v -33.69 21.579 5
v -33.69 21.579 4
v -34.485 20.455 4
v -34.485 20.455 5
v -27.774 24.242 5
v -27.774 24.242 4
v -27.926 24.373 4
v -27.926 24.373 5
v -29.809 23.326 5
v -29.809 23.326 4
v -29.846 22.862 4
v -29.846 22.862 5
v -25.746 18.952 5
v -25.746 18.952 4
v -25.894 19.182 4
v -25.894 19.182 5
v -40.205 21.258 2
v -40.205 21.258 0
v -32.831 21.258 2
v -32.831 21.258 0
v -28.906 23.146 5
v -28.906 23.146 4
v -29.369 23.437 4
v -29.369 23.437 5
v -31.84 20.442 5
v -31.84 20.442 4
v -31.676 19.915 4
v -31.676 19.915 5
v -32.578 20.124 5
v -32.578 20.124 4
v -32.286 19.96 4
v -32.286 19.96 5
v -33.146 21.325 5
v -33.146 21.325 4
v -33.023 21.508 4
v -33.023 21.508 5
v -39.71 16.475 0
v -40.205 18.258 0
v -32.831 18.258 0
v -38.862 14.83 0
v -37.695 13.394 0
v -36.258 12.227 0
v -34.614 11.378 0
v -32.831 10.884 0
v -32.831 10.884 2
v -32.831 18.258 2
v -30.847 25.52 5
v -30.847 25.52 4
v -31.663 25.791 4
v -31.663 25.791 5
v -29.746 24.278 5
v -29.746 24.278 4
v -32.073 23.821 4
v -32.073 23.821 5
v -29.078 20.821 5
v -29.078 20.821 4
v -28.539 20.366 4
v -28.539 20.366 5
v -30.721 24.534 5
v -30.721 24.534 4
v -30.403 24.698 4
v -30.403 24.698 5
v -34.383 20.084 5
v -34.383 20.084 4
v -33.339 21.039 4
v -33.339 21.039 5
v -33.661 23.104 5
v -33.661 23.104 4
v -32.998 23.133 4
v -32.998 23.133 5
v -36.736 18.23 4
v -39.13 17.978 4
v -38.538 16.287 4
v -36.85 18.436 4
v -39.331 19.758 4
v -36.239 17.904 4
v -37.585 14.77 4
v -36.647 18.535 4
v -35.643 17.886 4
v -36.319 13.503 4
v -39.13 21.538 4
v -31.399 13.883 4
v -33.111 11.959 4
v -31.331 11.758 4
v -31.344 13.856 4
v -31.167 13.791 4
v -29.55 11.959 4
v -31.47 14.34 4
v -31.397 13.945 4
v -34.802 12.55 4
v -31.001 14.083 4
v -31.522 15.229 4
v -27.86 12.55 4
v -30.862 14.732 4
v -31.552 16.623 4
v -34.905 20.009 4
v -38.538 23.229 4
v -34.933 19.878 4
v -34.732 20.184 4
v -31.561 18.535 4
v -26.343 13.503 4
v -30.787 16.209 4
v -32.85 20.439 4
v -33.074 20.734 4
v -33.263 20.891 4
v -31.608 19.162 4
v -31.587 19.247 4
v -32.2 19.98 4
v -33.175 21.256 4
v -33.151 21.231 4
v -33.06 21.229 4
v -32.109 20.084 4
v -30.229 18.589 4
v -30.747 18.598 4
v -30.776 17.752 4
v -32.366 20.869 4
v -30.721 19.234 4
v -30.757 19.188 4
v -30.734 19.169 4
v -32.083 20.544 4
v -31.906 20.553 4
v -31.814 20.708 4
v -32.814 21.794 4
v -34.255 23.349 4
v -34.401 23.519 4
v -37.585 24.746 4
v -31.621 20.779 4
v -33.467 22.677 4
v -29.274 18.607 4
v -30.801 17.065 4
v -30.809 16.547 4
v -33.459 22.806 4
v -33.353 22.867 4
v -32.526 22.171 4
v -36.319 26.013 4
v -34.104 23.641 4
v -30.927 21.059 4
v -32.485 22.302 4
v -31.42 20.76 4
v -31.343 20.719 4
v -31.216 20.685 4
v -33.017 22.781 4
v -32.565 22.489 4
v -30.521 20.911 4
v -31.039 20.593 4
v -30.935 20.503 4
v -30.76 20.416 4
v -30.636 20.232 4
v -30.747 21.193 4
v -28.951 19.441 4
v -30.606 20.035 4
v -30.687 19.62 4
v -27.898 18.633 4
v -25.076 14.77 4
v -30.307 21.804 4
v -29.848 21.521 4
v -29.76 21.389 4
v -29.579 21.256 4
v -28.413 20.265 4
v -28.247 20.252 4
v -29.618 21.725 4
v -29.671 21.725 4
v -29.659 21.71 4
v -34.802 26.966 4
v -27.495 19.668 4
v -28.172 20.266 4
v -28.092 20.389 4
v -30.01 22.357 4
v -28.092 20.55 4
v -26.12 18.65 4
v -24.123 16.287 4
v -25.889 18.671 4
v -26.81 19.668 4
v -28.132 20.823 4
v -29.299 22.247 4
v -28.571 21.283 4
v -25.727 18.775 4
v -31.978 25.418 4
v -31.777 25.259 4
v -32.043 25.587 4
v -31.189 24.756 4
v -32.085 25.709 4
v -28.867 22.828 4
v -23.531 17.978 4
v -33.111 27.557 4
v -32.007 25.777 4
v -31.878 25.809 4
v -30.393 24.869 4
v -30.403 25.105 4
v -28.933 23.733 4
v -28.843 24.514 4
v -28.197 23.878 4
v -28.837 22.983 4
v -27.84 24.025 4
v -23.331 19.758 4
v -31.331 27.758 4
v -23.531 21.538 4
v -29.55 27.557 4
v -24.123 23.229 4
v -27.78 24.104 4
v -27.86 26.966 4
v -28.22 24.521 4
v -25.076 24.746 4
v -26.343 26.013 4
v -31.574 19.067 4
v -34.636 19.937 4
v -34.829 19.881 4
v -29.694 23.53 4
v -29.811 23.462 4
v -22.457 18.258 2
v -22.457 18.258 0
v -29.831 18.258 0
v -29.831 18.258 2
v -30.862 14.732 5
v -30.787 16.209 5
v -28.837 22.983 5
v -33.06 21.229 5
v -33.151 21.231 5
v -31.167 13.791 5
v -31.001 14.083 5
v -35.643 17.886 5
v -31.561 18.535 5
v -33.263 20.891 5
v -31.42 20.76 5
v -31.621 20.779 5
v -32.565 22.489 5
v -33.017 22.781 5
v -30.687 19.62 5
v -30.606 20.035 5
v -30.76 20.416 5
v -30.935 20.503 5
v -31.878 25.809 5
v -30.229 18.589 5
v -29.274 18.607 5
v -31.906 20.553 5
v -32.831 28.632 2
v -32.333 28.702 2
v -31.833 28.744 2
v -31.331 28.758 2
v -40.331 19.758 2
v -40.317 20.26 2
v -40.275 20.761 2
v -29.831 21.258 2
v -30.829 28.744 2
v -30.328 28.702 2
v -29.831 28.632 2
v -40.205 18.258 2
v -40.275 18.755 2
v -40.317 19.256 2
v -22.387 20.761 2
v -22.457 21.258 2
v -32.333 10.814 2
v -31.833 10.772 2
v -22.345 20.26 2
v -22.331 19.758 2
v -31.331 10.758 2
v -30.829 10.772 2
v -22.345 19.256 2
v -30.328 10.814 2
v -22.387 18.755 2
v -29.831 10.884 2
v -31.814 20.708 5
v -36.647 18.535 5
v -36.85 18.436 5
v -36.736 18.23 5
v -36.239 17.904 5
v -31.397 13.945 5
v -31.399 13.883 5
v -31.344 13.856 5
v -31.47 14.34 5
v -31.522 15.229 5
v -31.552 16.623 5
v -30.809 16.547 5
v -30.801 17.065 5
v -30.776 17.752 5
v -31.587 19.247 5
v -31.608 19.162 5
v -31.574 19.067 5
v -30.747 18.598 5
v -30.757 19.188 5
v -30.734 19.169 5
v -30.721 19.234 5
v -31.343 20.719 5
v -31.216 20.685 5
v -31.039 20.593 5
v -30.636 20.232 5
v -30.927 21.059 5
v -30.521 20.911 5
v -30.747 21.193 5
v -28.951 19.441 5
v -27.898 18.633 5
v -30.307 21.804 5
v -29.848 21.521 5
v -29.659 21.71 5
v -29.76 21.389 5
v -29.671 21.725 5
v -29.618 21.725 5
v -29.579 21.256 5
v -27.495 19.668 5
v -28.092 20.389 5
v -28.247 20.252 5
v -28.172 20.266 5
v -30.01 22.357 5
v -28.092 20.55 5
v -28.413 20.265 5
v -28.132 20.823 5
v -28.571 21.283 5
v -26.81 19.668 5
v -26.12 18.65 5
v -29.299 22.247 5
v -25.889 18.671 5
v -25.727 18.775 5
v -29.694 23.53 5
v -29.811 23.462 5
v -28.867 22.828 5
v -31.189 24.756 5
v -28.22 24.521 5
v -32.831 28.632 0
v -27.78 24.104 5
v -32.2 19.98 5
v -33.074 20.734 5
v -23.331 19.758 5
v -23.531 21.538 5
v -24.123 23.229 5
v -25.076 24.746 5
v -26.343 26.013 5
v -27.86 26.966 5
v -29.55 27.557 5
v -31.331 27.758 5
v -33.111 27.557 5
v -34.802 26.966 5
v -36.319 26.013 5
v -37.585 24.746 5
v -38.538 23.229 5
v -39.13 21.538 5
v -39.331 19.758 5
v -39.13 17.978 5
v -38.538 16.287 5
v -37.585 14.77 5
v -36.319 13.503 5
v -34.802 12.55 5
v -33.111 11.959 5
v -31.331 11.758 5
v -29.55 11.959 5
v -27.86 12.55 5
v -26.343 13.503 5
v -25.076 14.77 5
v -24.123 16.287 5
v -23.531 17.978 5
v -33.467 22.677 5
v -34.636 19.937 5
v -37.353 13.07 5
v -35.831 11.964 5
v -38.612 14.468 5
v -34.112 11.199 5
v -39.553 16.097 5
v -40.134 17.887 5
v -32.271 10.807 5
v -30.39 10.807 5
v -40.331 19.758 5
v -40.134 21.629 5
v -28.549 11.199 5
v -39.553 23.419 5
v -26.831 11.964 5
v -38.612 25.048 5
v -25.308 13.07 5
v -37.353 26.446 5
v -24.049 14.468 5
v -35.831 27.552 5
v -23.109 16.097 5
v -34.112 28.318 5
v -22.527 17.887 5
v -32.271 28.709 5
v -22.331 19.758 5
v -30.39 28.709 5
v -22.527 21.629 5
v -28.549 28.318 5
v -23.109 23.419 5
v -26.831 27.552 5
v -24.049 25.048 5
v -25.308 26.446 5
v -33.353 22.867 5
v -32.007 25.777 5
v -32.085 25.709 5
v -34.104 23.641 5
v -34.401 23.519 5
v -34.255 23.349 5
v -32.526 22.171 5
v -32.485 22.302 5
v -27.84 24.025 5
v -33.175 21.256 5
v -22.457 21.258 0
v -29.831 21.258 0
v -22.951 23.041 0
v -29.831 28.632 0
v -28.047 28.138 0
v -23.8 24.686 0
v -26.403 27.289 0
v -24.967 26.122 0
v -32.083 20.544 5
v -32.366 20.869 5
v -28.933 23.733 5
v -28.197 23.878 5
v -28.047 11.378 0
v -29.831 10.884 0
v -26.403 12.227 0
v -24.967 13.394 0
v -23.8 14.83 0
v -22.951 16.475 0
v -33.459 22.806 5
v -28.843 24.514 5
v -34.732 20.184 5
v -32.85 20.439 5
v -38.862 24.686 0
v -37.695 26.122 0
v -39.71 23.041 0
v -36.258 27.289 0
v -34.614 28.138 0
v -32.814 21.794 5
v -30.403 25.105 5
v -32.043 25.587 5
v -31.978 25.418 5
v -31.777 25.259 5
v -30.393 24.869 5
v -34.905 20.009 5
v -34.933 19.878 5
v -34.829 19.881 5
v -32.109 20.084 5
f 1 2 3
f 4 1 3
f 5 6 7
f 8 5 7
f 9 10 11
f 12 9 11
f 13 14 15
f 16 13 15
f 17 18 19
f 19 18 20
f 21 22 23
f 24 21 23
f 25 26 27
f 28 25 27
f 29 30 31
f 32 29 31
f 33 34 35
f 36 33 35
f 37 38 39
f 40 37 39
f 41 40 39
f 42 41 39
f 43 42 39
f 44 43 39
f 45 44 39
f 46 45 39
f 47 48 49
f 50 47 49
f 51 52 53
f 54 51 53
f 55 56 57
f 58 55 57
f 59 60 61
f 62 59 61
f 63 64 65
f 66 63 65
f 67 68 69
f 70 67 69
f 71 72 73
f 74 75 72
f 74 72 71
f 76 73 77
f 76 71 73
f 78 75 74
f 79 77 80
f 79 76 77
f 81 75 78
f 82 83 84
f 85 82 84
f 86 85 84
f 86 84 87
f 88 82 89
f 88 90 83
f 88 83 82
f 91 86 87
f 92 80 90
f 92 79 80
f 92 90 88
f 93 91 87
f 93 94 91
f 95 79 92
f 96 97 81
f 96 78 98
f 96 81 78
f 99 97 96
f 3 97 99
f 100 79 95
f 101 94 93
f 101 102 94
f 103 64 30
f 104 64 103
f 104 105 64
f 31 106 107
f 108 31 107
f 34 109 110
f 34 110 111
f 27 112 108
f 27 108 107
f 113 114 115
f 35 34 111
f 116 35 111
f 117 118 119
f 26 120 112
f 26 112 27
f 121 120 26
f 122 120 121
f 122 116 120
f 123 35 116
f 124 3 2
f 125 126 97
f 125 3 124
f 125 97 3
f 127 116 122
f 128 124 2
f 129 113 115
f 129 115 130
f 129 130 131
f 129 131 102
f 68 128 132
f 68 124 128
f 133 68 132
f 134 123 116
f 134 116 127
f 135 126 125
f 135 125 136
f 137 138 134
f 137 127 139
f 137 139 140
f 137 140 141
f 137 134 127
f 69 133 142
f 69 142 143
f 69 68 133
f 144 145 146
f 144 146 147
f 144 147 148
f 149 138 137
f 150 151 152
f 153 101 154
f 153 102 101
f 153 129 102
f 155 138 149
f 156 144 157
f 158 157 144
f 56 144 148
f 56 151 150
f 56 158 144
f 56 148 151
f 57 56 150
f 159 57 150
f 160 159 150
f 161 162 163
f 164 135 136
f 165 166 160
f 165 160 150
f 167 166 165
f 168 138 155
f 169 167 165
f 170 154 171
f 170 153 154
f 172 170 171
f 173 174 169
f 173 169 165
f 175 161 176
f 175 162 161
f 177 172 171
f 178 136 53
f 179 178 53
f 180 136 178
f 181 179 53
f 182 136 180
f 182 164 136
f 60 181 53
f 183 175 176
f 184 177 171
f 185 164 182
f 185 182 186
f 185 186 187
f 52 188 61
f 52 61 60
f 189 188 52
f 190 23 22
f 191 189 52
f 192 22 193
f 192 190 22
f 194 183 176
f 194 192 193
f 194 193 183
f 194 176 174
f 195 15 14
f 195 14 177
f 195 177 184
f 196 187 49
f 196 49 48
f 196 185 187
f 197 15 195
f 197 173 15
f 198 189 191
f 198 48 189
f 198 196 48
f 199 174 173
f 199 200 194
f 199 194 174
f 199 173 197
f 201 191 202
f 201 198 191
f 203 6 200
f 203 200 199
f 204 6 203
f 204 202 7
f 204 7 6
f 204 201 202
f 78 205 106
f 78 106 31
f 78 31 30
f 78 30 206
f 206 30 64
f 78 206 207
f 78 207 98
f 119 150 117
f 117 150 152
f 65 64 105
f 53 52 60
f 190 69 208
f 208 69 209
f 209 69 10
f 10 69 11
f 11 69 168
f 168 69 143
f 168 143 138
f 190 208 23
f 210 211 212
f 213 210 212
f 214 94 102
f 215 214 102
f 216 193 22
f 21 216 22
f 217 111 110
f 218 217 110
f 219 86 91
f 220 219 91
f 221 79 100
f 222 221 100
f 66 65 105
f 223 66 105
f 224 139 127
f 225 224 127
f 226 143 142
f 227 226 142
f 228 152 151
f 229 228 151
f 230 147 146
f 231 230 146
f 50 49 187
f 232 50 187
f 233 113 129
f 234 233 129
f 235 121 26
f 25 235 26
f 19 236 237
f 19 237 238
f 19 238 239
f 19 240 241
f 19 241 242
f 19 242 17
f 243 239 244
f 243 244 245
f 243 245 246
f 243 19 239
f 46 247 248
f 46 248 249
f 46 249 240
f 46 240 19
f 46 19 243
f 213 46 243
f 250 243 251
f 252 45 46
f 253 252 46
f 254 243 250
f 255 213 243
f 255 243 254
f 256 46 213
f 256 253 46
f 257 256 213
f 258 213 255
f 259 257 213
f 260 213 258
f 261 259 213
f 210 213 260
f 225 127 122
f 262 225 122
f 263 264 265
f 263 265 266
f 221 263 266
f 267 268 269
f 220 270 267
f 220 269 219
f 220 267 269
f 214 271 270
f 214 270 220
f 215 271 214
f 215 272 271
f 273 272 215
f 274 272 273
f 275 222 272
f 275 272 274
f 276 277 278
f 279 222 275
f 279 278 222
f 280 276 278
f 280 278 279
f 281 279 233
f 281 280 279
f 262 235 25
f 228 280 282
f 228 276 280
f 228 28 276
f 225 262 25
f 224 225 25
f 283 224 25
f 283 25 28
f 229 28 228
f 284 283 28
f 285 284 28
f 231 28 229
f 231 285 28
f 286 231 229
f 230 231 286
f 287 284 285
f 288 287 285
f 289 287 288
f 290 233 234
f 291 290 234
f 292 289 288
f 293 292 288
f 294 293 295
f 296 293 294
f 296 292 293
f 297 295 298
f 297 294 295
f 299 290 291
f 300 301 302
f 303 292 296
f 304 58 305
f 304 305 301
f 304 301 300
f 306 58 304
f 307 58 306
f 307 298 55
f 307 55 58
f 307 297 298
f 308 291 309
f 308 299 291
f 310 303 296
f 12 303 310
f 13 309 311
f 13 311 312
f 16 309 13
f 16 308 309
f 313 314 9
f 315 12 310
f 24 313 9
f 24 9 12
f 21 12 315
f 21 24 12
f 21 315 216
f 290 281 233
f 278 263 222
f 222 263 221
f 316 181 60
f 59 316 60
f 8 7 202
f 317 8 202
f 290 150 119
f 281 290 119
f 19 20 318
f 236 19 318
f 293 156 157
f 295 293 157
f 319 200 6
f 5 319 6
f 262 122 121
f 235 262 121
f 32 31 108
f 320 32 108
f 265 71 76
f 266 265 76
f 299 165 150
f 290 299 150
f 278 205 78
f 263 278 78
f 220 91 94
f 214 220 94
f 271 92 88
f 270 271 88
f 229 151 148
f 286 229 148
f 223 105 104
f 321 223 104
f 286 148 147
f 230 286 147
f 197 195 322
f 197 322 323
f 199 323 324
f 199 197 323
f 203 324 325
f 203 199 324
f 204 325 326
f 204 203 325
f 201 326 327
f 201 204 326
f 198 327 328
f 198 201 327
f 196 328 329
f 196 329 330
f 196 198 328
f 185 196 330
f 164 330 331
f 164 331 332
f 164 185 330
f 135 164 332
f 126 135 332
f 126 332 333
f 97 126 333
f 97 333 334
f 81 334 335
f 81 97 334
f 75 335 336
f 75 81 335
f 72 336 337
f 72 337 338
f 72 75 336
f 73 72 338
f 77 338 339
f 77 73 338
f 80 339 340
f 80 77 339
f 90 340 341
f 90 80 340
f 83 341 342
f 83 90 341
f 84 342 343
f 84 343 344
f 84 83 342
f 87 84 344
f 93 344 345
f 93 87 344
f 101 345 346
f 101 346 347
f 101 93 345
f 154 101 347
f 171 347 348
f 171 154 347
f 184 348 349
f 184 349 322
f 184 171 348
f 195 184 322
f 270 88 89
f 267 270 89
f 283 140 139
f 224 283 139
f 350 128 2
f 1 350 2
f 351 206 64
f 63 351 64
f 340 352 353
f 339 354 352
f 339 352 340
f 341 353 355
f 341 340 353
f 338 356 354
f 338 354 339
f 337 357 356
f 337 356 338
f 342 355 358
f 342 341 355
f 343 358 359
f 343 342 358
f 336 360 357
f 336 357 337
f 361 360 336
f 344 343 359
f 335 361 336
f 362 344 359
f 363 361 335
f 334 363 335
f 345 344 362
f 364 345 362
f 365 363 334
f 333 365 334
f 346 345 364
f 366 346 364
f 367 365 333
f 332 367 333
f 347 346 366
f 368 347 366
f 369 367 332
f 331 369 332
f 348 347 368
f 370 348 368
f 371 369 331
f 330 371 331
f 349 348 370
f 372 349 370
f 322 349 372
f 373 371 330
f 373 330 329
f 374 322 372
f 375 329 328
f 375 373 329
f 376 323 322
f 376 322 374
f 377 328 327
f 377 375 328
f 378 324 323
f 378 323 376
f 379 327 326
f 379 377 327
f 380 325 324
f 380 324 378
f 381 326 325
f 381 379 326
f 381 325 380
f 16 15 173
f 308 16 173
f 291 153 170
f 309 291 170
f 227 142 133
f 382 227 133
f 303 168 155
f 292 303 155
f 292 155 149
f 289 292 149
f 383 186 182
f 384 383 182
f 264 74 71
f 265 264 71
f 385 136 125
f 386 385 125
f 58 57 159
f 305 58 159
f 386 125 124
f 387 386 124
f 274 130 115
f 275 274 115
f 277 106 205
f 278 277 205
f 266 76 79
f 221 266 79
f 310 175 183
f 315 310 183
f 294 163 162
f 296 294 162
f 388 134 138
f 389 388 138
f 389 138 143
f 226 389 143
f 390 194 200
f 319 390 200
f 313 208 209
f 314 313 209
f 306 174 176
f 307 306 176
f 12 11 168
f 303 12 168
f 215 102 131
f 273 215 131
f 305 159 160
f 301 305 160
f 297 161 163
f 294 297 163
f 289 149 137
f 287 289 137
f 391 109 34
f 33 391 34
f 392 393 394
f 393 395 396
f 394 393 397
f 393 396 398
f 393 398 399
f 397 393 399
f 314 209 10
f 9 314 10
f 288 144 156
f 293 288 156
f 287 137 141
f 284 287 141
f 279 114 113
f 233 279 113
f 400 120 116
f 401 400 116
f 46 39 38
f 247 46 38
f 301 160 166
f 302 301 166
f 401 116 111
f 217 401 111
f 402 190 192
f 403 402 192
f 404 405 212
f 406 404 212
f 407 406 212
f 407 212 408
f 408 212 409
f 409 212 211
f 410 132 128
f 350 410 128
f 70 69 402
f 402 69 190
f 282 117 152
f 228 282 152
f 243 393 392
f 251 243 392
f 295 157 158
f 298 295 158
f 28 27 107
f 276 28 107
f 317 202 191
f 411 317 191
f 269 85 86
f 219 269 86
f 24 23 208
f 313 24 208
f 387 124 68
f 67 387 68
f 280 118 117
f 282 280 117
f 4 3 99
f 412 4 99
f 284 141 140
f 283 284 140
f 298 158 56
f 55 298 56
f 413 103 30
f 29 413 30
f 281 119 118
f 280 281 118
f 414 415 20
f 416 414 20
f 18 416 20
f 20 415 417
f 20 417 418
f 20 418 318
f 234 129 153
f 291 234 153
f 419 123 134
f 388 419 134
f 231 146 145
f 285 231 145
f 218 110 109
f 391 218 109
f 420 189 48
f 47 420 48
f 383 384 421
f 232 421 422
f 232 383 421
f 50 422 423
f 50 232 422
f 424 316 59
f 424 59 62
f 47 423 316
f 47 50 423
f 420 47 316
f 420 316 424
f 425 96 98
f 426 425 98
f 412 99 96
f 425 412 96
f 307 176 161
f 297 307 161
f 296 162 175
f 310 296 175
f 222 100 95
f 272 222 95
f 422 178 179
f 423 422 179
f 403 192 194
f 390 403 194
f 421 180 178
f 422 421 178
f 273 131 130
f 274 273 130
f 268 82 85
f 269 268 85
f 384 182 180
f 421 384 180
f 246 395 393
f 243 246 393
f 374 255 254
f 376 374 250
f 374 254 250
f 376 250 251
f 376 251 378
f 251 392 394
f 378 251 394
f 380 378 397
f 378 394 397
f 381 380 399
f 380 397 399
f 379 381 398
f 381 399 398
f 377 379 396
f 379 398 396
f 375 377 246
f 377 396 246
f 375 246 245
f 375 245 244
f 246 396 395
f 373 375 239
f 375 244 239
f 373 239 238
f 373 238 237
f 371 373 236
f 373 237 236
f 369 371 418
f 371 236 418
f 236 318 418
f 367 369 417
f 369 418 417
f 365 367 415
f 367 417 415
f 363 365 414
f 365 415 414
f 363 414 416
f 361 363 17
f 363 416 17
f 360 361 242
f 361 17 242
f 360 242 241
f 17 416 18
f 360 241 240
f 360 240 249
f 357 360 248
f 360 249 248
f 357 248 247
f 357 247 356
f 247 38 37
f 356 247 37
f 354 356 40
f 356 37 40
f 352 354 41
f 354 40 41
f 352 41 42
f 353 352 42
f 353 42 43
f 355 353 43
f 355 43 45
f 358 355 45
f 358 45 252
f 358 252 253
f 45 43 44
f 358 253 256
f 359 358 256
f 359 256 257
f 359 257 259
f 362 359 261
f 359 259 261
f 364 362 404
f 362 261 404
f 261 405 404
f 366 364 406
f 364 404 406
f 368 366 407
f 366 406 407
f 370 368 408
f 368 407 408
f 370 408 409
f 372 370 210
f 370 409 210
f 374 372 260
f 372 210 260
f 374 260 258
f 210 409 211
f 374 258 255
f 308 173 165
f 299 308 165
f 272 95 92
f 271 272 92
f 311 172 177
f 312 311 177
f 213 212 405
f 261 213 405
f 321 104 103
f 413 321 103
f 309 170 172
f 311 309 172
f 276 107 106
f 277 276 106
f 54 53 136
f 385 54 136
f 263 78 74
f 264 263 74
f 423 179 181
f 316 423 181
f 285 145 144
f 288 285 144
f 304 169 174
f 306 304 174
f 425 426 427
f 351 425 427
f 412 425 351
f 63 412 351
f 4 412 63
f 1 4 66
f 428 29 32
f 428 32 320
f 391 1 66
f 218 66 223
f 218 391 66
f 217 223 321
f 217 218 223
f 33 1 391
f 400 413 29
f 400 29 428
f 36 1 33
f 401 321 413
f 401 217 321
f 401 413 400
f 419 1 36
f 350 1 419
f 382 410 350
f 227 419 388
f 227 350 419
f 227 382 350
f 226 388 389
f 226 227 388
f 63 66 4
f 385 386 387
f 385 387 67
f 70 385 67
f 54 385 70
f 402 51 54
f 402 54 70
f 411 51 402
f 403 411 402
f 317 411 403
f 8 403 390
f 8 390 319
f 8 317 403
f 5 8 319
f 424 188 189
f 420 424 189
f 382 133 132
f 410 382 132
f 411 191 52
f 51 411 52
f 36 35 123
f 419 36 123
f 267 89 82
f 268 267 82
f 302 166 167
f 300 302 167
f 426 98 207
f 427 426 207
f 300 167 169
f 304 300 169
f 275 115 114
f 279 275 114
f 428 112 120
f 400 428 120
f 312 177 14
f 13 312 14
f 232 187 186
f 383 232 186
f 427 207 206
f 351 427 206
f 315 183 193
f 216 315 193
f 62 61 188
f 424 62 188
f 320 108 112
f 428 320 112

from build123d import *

# Parameters (mm, degrees)
F0_R     = 9
F1_DEPTH = 4
F3_W     = 3
F3_H     = 3
F4_DEPTH = 2
F2_R     = 9
F2_R_2   = 8
F5_DEPTH = 1
F7_DEPTH = 1


# Not quite as in the source:
# - a feature names something its author has since deleted; it is built from what else it names


with BuildPart() as f1:
    # F0 (on Top) → F1 (new body)
    with BuildSketch(Plane.XY):
        with Locations((-31.3306450844, 19.7580661625)):
            Circle(F0_R)
    extrude(amount=F1_DEPTH)

    # F3 (on face) → F4 (cut)
    with BuildSketch(Plane(origin=(0, 0, 0), x_dir=(1, 0, 0), z_dir=(0, 0, -1))):
        with BuildLine():
            ThreePointArc((-32.8306450844, -28.6321858371), (-32.0832814269, -28.7265408676), (-31.3306450844, -28.7580661625))
            ThreePointArc((-31.3306450844, -28.7580661625), (-30.5780087419, -28.7265408676), (-29.8306450844, -28.6321858371))
            Line((-29.8306450844, -28.6321858371), (-29.8306450844, -21.2580661625))
            Line((-29.8306450844, -21.2580661625), (-32.8306450844, -21.2580661625))
            Line((-32.8306450844, -21.2580661625), (-32.8306450844, -28.6321858371))
        make_face()
        with BuildLine():
            ThreePointArc((-40.204764759, -18.2580661625), (-40.2991197895, -19.0054298199), (-40.3306450844, -19.7580661625))
            ThreePointArc((-40.3306450844, -19.7580661625), (-40.2991197895, -20.510702505), (-40.204764759, -21.2580661625))
            Line((-40.204764759, -21.2580661625), (-32.8306450844, -21.2580661625))
            Line((-32.8306450844, -21.2580661625), (-32.8306450844, -18.2580661625))
            Line((-32.8306450844, -18.2580661625), (-40.204764759, -18.2580661625))
        make_face()
        with Locations((-31.3306450844, -19.7580661625)):
            Rectangle(F3_W, F3_H)
        with BuildLine():
            Line((-29.8306450844, -18.2580661625), (-29.8306450844, -21.2580661625))
            Line((-29.8306450844, -21.2580661625), (-22.4565254097, -21.2580661625))
            ThreePointArc((-22.4565254097, -21.2580661625), (-22.3621703793, -20.510702505), (-22.3306450844, -19.7580661625))
            ThreePointArc((-22.3306450844, -19.7580661625), (-22.3621703793, -19.0054298199), (-22.4565254097, -18.2580661625))
            Line((-22.4565254097, -18.2580661625), (-29.8306450844, -18.2580661625))
        make_face()
        with BuildLine():
            Line((-32.8306450844, -10.8839464878), (-32.8306450844, -18.2580661625))
            Line((-32.8306450844, -18.2580661625), (-29.8306450844, -18.2580661625))
            Line((-29.8306450844, -18.2580661625), (-29.8306450844, -10.8839464878))
            ThreePointArc((-29.8306450844, -10.8839464878), (-30.5780087419, -10.7895914574), (-31.3306450844, -10.7580661625))
            ThreePointArc((-31.3306450844, -10.7580661625), (-32.0832814269, -10.7895914574), (-32.8306450844, -10.8839464878))
        make_face()
    extrude(amount=-F4_DEPTH, mode=Mode.SUBTRACT)

    # F2 (on face) → F5 (join)
    with BuildSketch(Plane.XY.offset(4)):
        with Locations((-31.3306450844, 19.7580661625)):
            Circle(F2_R)
        with Locations((-31.3306450844, 19.7580661625)):
            Circle(F2_R_2, mode=Mode.SUBTRACT)
    extrude(amount=F5_DEPTH)

    # F6 (on face) → F7 (join)
    with BuildSketch(Plane.XY.offset(4)):
        Polygon((-31.9784342899, 25.4181322135), (-31.7774611038, 25.2590085979), (-31.1892692607, 24.7560993929), (-30.7208457687, 24.5338144768), (-30.4025390075, 24.6978790801), (-30.392716562, 24.8693254), (-30.4025390075, 25.1047664399), (-30.8471683696, 25.5198689359), (-31.6626039755, 25.7905517194), (-31.8783703596, 25.8094227206), (-32.0071634544, 25.7774551255), (-32.085100094, 25.7093528374), (-32.0432445706, 25.5871378045), align=None)
        Polygon((-32.0727952488, 23.82088353), (-34.1039519464, 23.641281604), (-34.4009291186, 23.5190665711), (-34.2549080498, 23.3492275605), (-33.6609834704, 23.1039640751), (-32.9981350893, 23.1326575217), (-28.9325058746, 23.7331363511), (-28.1966558885, 23.8783299532), (-27.8397737053, 24.0251903945), (-27.7799460833, 24.1039485477), (-27.774171676, 24.2417604333), (-27.925973105, 24.373024022), (-28.2204678774, 24.520658353), (-28.8430918564, 24.514110056), (-29.7462805942, 24.2778355965), align=None)
        Polygon((-34.382885584, 20.0842467066), (-33.3393966077, 21.0391074603), (-33.2631029954, 20.8914731293), (-33.073613141, 20.7339568229), (-32.8504769463, 20.4394620505), (-32.5781154176, 20.1235960182), (-32.2860792331, 19.9595314149), (-32.1999334103, 19.9800692553), (-32.1088704119, 20.0842467066), (-32.0826236472, 20.5436395019), (-32.3664685075, 20.8693279796), (-33.0604867821, 21.2294247813), (-33.1507282669, 21.2310916205), (-33.1753379574, 21.255677499), (-33.1457872792, 21.3246132068), (-33.0227447798, 21.5075488113), (-32.8135564575, 21.7938284475), (-32.5256159351, 22.1711889411), (-32.4854153449, 22.3016191102), (-32.5649890587, 22.4894957023), (-33.0170120434, 22.7807163262), (-33.3525229666, 22.866856196), (-33.4591649588, 22.8061356243), (-33.4673741419, 22.6765388749), (-33.689688823, 21.578925248), (-34.4845925415, 20.4550589033), (-34.7323443797, 20.1843165898), (-34.9046181661, 20.0087627019), (-34.9333294717, 19.8783325328), (-34.8291579734, 19.8807732617), (-34.6355486449, 19.9373862652), align=None)
        Polygon((-35.6429326931, 17.8857095862), (-31.560897018, 18.5354375615), (-31.5518663213, 16.6232038893), (-31.5215238944, 15.2286190431), (-31.4698399726, 14.3401836183), (-31.3968205087, 13.9447772089), (-31.3992731436, 13.8832511968), (-31.3443150733, 13.8561793466), (-31.1671300641, 13.7905517194), (-31.0005771079, 14.0834147752), (-30.8619318027, 14.7323117121), (-30.786507328, 16.2089407659), (-30.8094263673, 16.546904324), (-30.8012707611, 17.064559103), (-30.775851463, 17.7519993157), (-30.7470984864, 18.5977892544), (-30.2294853783, 18.5887585576), (-29.2737316751, 18.6067961392), (-27.8980535481, 18.6330488569), (-26.120369519, 18.6502887368), (-25.8890360471, 18.6707849062), (-25.726578753, 18.7749742635), (-25.7462831738, 18.9521771317), (-25.8939175048, 19.1818616234), (-26.8102623665, 19.6675071364), (-27.4952737563, 19.6675071364), (-28.9505434561, 19.4410967932), (-30.7340018925, 19.1687352645), (-30.7569209318, 19.1884337323), (-30.7208457687, 19.2343670588), (-30.6872113344, 19.6199188766), (-30.6060124524, 20.0350154196), (-30.6355393186, 20.2318810376), (-30.7602546103, 20.4156500617), (-30.9349750786, 20.502623351), (-31.0391525299, 20.5928707888), (-30.5207060022, 20.9111775501), (-29.8480173166, 21.5214788248), (-29.7602701377, 21.3886079269), (-29.5789418424, 21.255677499), (-29.0776994767, 20.8209301122), (-28.5387151086, 20.3664187747), (-28.4132259273, 20.2647415822), (-28.2466610651, 20.2515854584), (-28.17201048, 20.2655750018), (-28.0924784372, 20.3893973439), (-28.0924784372, 20.5501877988), (-28.1318277488, 20.8225374215), (-28.5707422337, 21.2827636364), (-29.618291154, 21.7249522697), (-29.6593073048, 21.7101888366), (-29.6707965895, 21.7249522697), (-29.2992105032, 22.2466729458), (-28.8668443153, 22.8275068844), (-28.8373174491, 22.9825229319), (-28.9062531568, 23.1457541156), (-29.3689201006, 23.4369747395), (-29.6937751587, 23.5296629062), (-29.8111087339, 23.461620148), (-29.8086084751, 23.3262489912), (-29.8455765878, 22.8619152083), (-30.0095816611, 22.3566248045), (-30.3074101119, 21.8037104229), (-30.7470984864, 21.1933496182), (-30.9267599424, 21.0588118811), (-31.2163375391, 20.6847255359), (-31.342677999, 20.7191933898), (-31.419793125, 20.7602095406), (-31.620772264, 20.7790805418), (-31.8135600789, 20.7077041052), (-31.9062541986, 20.5534619473), (-31.8398127967, 20.4419027794), (-31.6757303344, 19.9152411156), (-31.5871497358, 19.2474934177), (-31.6084674188, 19.1621869676), (-31.5740233769, 19.067010448), (-36.6470354491, 18.5354375615), (-36.8504809149, 18.4361653799), (-36.7356315255, 18.2302750181), (-36.2385062527, 17.9037709798), align=None)
    extrude(amount=F7_DEPTH)


solid = f1.part
